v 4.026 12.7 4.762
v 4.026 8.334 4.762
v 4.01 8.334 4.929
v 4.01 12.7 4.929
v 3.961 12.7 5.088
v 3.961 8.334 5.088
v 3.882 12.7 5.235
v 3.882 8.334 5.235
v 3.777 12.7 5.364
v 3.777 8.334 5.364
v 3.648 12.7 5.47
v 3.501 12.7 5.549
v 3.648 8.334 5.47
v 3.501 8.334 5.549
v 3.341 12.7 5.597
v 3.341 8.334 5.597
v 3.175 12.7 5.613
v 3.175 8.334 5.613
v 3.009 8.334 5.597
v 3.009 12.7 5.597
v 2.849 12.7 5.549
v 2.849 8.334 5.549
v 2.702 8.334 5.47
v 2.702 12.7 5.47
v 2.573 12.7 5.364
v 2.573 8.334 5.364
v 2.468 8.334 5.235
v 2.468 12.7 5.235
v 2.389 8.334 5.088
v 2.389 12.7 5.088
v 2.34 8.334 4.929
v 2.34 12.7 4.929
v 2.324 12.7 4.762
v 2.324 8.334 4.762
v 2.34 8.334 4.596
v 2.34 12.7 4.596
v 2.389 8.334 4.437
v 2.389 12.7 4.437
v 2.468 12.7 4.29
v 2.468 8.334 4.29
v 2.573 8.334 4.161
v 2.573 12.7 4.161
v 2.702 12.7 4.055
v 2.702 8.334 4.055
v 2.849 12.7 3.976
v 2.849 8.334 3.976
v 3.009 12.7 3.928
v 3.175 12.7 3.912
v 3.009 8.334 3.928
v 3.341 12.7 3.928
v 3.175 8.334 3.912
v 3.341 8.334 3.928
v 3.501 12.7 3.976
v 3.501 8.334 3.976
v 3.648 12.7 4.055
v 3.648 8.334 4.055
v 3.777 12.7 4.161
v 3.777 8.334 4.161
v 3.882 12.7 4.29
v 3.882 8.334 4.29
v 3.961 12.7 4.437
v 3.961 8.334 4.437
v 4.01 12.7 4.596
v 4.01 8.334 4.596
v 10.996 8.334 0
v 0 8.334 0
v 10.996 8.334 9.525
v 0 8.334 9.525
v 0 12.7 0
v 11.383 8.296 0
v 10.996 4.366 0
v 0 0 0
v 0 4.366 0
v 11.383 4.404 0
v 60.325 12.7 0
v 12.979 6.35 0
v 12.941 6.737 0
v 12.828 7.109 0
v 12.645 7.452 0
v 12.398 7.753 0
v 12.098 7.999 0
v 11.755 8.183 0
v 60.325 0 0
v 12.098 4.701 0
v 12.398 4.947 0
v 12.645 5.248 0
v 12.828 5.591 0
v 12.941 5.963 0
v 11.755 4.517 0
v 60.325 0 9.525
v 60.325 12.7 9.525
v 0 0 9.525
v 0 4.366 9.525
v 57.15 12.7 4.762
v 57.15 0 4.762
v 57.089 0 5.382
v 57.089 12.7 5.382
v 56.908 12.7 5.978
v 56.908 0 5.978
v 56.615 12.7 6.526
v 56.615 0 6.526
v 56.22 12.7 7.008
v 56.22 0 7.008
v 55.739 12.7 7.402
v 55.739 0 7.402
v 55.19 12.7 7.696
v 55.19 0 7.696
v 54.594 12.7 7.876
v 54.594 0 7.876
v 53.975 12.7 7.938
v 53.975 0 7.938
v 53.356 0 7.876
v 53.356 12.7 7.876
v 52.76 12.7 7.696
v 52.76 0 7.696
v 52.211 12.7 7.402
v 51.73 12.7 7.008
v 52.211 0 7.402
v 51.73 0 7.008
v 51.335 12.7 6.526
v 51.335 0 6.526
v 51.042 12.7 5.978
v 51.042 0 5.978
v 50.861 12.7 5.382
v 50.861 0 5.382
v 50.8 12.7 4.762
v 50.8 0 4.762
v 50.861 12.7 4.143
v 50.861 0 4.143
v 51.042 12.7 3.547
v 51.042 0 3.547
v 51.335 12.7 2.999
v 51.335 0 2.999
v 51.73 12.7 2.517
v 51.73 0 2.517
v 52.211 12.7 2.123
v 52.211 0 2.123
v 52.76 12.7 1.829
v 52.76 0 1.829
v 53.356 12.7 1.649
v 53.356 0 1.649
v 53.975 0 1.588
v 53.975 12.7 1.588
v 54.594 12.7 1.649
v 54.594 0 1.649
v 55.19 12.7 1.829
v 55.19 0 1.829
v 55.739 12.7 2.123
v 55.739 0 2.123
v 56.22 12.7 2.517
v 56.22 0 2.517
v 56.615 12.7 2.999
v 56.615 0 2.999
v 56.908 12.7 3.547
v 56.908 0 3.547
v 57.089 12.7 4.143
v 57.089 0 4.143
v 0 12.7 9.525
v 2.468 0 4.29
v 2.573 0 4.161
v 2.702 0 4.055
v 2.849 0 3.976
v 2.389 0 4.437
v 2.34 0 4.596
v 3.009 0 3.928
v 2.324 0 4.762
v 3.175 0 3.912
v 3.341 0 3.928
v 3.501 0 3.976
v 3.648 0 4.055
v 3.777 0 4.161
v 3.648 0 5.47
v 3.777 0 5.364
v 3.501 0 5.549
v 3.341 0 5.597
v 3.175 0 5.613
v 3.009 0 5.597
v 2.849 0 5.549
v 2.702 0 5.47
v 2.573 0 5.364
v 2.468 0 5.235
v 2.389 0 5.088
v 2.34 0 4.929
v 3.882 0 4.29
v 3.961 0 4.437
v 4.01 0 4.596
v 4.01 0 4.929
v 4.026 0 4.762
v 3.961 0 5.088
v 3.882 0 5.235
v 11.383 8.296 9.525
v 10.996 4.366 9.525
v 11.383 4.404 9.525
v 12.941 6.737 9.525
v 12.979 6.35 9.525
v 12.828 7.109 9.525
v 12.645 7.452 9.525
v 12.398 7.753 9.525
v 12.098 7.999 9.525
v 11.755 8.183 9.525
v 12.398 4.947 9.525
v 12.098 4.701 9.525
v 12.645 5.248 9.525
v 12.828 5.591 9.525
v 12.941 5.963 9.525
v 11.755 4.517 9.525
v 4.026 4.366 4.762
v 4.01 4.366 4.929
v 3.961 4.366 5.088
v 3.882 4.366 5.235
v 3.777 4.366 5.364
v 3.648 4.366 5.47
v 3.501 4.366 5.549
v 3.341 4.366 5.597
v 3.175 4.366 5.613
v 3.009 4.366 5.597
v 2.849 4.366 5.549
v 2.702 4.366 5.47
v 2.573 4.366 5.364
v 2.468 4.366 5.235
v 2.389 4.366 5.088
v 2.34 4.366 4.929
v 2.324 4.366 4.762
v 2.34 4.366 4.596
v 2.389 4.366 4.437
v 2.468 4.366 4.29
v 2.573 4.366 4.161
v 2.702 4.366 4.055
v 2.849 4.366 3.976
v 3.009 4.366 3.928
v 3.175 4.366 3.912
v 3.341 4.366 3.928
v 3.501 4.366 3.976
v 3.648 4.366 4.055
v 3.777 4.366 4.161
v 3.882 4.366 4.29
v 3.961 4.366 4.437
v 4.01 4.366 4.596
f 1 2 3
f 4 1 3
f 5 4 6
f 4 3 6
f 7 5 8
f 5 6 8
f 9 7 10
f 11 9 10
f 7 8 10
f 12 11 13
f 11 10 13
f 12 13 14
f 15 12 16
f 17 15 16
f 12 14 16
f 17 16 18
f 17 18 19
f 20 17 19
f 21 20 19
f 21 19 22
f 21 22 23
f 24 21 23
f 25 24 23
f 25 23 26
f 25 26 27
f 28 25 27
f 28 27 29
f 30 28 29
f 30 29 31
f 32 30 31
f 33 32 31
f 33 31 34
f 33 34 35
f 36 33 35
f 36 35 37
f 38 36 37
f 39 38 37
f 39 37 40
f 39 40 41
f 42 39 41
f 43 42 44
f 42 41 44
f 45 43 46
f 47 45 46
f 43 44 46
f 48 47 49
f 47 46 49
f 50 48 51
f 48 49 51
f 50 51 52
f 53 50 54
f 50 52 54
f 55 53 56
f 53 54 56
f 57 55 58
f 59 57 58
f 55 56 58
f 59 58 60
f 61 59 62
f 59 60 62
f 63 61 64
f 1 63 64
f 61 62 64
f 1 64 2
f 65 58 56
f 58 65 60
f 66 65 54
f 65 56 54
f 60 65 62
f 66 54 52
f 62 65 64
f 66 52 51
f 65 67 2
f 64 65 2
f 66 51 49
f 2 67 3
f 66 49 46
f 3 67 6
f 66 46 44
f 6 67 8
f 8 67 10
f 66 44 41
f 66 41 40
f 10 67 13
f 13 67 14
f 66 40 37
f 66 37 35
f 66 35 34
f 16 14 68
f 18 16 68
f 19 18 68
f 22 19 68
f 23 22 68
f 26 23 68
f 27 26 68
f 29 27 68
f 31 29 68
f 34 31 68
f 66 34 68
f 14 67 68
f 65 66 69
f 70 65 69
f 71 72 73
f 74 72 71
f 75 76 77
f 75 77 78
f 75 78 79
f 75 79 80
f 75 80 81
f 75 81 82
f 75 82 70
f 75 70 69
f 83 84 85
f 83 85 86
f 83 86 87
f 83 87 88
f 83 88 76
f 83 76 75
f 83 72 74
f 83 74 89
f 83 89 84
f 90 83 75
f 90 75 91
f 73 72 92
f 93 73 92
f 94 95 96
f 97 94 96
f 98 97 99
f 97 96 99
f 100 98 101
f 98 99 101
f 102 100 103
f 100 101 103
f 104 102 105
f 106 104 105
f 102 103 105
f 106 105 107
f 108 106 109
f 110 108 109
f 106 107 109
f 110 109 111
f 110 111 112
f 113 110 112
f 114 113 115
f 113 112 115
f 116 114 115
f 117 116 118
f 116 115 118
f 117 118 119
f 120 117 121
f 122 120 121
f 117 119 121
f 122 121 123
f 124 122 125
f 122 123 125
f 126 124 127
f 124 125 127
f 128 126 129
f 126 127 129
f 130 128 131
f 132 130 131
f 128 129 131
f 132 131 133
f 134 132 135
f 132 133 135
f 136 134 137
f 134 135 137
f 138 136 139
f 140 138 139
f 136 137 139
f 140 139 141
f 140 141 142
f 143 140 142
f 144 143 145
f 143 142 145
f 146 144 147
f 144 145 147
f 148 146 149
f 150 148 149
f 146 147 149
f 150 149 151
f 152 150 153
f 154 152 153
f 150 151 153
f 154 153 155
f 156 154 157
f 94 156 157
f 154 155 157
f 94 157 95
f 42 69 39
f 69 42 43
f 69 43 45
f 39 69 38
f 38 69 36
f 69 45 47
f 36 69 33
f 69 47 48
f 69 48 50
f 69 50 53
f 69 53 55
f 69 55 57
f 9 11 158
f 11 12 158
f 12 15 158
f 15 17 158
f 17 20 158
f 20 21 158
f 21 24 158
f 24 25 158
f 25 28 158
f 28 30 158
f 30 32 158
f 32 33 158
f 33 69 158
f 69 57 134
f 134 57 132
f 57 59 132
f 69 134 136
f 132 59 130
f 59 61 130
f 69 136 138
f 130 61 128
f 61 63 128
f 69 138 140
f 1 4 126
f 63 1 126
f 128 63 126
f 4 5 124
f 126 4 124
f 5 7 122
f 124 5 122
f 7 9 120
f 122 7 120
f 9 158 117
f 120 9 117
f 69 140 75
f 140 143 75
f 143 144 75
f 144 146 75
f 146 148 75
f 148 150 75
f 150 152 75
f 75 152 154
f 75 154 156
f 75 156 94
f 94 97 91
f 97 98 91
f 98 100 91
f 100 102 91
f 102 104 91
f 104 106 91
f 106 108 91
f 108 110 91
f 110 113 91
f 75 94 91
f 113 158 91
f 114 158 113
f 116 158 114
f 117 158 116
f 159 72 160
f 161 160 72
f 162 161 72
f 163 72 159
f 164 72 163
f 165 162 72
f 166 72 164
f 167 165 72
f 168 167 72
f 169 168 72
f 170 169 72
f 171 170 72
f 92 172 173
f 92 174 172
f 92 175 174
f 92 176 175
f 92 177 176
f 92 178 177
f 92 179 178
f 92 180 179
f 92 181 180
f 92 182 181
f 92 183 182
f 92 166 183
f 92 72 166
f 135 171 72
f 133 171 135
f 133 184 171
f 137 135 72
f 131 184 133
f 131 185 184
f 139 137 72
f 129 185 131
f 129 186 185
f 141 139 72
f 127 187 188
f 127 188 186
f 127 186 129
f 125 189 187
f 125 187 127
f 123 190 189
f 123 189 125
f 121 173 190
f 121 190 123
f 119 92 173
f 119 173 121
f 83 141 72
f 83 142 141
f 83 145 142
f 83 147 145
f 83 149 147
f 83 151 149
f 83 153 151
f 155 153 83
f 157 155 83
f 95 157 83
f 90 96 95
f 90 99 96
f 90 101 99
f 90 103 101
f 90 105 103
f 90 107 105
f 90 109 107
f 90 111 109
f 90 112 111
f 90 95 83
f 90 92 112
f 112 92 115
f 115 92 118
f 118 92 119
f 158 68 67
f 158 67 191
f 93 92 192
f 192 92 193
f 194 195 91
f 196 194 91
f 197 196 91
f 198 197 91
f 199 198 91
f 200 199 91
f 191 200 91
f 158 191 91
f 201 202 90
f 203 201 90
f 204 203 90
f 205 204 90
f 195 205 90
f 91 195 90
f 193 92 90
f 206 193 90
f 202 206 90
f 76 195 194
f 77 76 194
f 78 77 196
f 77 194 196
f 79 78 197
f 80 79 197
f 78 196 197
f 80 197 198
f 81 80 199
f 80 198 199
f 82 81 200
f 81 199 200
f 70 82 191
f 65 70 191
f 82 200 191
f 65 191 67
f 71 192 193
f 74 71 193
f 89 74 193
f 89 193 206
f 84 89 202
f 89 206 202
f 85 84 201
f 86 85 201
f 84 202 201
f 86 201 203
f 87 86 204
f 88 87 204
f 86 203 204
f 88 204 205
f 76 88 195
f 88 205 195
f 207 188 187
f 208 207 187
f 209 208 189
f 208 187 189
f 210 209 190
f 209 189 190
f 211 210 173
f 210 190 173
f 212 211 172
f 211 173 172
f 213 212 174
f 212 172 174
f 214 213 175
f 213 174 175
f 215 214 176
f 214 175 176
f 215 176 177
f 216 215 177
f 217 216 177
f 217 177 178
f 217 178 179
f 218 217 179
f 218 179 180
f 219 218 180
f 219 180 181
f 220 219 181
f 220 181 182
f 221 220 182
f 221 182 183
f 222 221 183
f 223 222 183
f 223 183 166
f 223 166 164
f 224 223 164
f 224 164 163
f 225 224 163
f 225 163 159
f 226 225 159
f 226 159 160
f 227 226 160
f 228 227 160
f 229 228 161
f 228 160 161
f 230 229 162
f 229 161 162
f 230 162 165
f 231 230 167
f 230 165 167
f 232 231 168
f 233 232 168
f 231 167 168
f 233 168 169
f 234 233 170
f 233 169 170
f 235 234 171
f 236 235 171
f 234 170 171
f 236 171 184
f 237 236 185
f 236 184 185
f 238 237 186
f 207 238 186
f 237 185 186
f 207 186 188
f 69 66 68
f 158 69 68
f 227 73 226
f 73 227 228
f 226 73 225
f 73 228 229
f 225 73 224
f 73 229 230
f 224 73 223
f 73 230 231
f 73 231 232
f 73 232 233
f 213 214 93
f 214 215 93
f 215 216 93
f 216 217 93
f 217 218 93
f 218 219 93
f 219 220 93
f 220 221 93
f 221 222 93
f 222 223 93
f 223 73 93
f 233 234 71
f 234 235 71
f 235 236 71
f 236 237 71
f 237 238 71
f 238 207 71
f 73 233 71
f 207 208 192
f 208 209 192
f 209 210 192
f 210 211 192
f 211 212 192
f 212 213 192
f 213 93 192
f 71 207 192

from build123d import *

# Parameters (mm, degrees)
F0_W     = 60.325
F0_H     = 9.525
F0_R     = 0.8509
F0_R_2   = 3.175
F1_DEPTH = 12.7
F3_DEPTH = 9.526


# Not quite as in the source:
# - a feature of the source that left no trace in its solid (it failed there, or was rolled back) is left out


with BuildPart() as f1:
    # F0 (on Front) → F1 (new body)
    with BuildSketch(Plane.XZ):
        with Locations((30.1625, 4.7625)):
            Rectangle(F0_W, F0_H)
        with Locations((3.175, 4.7625)):
            Circle(F0_R, mode=Mode.SUBTRACT)
        with Locations((53.975, 4.7625)):
            Circle(F0_R_2, mode=Mode.SUBTRACT)
    extrude(amount=-F1_DEPTH)

    # F2 (on face) → F3 (cut, through all)
    with BuildSketch(Plane.XY.offset(9.525)):
        with BuildLine():
            Line((10.99566, 8.33374), (0, 8.33374))
            Line((0, 8.33374), (0, 4.36626))
            Line((0, 4.36626), (10.99566, 4.36626))
            ThreePointArc((10.99566, 4.36626), (12.3983760061, 4.9472839939), (12.9794, 6.35))
            ThreePointArc((12.9794, 6.35), (12.3983760061, 7.7527160061), (10.99566, 8.33374))
        make_face()
    extrude(amount=-F3_DEPTH, mode=Mode.SUBTRACT)


solid = f1.part
